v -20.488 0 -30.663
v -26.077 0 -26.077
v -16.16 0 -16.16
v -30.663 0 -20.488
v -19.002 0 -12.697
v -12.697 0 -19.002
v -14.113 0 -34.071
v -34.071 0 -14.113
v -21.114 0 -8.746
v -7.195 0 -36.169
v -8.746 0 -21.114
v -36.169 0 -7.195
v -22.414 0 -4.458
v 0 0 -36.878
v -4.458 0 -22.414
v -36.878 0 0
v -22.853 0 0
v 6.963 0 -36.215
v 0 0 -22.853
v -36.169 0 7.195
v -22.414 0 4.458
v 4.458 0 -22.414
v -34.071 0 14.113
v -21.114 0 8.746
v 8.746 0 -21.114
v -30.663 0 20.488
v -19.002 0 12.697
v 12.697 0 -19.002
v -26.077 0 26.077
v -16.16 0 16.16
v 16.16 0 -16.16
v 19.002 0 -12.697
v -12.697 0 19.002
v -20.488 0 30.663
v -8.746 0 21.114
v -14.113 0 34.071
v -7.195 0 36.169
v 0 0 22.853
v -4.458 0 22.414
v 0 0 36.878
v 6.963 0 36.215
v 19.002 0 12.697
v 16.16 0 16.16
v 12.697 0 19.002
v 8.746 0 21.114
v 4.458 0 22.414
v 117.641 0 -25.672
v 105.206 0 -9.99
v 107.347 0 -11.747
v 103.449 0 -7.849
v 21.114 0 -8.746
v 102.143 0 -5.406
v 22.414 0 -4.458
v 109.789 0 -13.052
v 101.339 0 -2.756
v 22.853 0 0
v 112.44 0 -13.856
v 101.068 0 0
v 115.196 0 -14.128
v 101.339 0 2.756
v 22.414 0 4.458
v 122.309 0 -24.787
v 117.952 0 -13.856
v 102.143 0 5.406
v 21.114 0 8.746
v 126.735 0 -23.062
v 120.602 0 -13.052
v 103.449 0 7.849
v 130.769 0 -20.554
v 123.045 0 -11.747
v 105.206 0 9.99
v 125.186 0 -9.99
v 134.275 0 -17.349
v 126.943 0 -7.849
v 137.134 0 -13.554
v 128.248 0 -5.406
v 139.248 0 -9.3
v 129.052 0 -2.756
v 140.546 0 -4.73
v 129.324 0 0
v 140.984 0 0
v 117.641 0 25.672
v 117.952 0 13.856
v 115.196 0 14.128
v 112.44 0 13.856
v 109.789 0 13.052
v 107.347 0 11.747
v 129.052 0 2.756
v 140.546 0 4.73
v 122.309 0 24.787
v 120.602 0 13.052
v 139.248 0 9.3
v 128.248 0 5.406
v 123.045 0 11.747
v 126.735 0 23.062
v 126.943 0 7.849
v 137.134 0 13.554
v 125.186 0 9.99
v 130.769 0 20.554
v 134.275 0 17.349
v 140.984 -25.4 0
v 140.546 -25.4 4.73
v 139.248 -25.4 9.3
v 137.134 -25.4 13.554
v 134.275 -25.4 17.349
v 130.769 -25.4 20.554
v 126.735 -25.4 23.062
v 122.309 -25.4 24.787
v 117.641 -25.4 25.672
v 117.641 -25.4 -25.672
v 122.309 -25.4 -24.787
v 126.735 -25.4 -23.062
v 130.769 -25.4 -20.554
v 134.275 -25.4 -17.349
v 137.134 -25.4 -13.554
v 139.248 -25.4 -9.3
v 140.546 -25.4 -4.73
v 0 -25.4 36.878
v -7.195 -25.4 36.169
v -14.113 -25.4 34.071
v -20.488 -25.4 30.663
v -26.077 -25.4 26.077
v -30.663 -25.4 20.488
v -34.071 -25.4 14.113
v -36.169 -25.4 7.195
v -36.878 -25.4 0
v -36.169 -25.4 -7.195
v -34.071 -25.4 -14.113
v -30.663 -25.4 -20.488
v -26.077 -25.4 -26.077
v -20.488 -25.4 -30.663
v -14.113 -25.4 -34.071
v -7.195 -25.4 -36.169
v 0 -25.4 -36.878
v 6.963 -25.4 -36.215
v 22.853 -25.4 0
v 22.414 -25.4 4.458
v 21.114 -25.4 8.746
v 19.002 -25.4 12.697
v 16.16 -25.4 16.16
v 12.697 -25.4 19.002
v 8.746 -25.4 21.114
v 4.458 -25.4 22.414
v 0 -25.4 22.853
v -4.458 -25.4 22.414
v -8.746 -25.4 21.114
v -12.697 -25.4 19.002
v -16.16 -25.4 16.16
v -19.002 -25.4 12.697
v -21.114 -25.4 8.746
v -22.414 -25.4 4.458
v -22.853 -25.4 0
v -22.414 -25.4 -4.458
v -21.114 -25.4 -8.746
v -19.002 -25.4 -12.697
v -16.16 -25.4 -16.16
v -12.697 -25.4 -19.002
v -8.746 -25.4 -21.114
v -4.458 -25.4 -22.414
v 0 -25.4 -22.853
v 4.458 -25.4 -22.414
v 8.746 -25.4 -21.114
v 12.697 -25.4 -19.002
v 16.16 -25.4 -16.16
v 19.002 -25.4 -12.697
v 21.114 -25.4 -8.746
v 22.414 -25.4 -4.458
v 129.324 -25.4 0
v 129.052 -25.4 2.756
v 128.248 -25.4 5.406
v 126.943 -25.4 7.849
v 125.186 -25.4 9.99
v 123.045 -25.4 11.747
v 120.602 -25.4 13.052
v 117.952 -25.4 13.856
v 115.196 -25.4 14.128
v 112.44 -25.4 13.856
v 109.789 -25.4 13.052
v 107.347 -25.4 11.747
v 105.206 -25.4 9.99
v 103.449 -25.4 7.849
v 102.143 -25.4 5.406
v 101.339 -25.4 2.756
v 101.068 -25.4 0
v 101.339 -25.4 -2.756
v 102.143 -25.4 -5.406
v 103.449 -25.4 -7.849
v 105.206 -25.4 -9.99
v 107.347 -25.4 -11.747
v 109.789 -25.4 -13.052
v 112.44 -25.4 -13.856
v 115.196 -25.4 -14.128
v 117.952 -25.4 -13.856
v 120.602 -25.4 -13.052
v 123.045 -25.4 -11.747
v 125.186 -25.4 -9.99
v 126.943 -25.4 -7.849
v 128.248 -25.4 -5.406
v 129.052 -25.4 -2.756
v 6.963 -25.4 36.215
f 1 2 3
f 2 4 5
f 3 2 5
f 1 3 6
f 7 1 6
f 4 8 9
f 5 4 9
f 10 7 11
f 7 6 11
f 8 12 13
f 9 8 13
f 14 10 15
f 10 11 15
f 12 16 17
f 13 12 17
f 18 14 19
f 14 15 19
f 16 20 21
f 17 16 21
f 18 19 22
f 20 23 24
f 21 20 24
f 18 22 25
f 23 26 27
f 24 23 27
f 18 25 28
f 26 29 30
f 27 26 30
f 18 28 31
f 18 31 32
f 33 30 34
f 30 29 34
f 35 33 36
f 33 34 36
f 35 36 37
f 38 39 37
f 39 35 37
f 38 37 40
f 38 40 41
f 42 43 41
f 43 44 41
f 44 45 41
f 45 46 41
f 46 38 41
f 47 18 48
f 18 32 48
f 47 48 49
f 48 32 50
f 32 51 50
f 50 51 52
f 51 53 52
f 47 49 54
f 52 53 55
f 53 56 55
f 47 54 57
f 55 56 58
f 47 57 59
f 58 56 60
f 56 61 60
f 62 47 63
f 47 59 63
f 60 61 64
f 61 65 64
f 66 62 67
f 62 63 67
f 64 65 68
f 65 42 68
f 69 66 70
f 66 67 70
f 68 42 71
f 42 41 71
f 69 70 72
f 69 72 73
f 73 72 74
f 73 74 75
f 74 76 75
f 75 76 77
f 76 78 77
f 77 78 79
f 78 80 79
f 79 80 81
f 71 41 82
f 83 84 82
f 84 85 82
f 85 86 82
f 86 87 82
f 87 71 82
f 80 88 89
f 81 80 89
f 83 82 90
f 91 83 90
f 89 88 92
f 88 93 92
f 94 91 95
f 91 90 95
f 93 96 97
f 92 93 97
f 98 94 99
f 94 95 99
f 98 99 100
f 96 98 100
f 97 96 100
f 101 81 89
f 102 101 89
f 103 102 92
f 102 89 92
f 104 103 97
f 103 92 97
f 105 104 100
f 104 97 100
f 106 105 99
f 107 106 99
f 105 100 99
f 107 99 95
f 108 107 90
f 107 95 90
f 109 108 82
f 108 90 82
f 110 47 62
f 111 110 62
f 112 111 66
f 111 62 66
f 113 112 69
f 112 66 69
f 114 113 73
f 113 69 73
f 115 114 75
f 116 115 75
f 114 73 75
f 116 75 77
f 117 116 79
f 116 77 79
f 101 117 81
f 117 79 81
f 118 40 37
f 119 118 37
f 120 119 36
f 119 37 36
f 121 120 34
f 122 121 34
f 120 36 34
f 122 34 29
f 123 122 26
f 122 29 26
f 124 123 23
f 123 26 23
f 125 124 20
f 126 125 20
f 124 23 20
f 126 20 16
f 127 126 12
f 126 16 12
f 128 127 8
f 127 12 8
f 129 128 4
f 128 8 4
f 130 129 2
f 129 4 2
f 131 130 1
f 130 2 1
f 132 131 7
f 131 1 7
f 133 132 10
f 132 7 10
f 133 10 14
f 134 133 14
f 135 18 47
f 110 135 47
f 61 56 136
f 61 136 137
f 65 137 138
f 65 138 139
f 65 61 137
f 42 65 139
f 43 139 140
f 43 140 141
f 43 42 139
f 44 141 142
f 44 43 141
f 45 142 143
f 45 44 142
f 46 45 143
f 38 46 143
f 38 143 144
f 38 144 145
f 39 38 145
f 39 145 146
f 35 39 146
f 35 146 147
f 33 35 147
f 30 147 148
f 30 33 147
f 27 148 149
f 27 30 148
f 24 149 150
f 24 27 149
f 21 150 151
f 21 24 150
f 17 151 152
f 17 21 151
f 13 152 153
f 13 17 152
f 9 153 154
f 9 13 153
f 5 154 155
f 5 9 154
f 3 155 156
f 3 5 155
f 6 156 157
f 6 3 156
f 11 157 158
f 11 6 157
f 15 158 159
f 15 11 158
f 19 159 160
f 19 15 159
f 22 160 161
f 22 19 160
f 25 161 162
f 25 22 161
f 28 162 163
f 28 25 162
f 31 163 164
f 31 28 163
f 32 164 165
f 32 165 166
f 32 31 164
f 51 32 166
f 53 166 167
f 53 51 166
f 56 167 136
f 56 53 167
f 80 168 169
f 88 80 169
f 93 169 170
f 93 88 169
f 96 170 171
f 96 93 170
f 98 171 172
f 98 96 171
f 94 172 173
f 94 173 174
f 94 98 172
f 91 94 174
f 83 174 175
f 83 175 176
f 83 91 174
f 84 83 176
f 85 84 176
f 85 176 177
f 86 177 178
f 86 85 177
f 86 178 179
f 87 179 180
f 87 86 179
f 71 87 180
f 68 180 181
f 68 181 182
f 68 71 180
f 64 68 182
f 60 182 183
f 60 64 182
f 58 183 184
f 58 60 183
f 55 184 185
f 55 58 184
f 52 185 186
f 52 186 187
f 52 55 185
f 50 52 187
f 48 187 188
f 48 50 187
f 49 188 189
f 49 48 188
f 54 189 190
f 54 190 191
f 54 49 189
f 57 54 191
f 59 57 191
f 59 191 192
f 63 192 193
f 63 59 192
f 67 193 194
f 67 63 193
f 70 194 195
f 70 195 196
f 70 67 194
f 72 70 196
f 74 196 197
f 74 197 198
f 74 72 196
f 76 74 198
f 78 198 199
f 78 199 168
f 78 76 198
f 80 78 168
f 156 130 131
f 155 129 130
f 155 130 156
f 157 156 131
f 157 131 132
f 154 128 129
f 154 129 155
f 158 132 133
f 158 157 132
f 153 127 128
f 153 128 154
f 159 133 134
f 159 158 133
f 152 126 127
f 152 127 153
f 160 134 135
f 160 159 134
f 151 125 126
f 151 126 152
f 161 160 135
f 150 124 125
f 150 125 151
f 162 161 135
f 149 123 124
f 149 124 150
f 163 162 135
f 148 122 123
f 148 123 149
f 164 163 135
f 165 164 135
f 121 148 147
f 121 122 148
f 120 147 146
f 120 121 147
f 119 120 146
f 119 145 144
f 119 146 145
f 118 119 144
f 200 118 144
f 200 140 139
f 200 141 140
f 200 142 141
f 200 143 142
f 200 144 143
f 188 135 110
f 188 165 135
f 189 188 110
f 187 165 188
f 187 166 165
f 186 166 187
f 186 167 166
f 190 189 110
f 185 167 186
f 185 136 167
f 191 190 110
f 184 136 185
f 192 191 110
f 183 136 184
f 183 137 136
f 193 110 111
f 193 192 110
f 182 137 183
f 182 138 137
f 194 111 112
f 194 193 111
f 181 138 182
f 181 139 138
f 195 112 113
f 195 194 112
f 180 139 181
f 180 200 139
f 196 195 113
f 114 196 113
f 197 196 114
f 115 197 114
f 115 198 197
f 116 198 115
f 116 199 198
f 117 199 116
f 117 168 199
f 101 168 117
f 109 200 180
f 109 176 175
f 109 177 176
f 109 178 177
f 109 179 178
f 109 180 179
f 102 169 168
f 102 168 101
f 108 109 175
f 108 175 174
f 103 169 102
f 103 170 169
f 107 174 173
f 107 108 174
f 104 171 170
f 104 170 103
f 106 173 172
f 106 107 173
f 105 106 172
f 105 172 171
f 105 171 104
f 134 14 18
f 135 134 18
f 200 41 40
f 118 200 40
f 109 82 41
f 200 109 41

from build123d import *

# Parameters (mm, degrees)
F0_R     = 22.8532905428
F0_R_2   = 14.1278184646
F1_DEPTH = 25.4


with BuildPart() as f1:
    # F0 (on Front) → F1 (new body)
    with BuildSketch(Plane.XZ):
        with BuildLine():
            Line((6.9627707482, 36.2147105875), (0, 36.8779804142))
            ThreePointArc((0, 36.8779804142), (-36.8779804142, 0), (0, -36.8779804142))
            Line((0, -36.8779804142), (6.9627707482, -36.2147105875))
            ThreePointArc((6.9627707482, -36.2147105875), (28.4320098015, -23.4862993695), (36.8779804142, 0))
            ThreePointArc((36.8779804142, 0), (28.4320098015, 23.4862993695), (6.9627707482, 36.2147105875))
        make_face()
        Circle(F0_R, mode=Mode.SUBTRACT)
        with BuildLine():
            Line((117.6412233187, 25.6715402452), (6.9627707482, 36.2147105875))
            ThreePointArc((6.9627707482, 36.2147105875), (28.4320098015, 23.4862993695), (36.8779804142, 0))
            ThreePointArc((36.8779804142, 0), (28.4320098015, -23.4862993695), (6.9627707482, -36.2147105875))
            Line((6.9627707482, -36.2147105875), (117.6412233187, -25.6715402452))
            ThreePointArc((117.6412233187, -25.6715402452), (89.4080124161, 0), (117.6412233187, 25.6715402452))
        make_face()
        with BuildLine():
            ThreePointArc((140.9835197666, 0), (134.2754816057, 17.3485646526), (117.6412233187, 25.6715402452))
            ThreePointArc((117.6412233187, 25.6715402452), (89.4080124161, 0), (117.6412233187, -25.6715402452))
            ThreePointArc((117.6412233187, -25.6715402452), (134.2754816057, -17.3485646526), (140.9835197666, 0))
        make_face()
        with Locations((115.1957660913, 0)):
            Circle(F0_R_2, mode=Mode.SUBTRACT)
    extrude(amount=F1_DEPTH)


solid = f1.part
